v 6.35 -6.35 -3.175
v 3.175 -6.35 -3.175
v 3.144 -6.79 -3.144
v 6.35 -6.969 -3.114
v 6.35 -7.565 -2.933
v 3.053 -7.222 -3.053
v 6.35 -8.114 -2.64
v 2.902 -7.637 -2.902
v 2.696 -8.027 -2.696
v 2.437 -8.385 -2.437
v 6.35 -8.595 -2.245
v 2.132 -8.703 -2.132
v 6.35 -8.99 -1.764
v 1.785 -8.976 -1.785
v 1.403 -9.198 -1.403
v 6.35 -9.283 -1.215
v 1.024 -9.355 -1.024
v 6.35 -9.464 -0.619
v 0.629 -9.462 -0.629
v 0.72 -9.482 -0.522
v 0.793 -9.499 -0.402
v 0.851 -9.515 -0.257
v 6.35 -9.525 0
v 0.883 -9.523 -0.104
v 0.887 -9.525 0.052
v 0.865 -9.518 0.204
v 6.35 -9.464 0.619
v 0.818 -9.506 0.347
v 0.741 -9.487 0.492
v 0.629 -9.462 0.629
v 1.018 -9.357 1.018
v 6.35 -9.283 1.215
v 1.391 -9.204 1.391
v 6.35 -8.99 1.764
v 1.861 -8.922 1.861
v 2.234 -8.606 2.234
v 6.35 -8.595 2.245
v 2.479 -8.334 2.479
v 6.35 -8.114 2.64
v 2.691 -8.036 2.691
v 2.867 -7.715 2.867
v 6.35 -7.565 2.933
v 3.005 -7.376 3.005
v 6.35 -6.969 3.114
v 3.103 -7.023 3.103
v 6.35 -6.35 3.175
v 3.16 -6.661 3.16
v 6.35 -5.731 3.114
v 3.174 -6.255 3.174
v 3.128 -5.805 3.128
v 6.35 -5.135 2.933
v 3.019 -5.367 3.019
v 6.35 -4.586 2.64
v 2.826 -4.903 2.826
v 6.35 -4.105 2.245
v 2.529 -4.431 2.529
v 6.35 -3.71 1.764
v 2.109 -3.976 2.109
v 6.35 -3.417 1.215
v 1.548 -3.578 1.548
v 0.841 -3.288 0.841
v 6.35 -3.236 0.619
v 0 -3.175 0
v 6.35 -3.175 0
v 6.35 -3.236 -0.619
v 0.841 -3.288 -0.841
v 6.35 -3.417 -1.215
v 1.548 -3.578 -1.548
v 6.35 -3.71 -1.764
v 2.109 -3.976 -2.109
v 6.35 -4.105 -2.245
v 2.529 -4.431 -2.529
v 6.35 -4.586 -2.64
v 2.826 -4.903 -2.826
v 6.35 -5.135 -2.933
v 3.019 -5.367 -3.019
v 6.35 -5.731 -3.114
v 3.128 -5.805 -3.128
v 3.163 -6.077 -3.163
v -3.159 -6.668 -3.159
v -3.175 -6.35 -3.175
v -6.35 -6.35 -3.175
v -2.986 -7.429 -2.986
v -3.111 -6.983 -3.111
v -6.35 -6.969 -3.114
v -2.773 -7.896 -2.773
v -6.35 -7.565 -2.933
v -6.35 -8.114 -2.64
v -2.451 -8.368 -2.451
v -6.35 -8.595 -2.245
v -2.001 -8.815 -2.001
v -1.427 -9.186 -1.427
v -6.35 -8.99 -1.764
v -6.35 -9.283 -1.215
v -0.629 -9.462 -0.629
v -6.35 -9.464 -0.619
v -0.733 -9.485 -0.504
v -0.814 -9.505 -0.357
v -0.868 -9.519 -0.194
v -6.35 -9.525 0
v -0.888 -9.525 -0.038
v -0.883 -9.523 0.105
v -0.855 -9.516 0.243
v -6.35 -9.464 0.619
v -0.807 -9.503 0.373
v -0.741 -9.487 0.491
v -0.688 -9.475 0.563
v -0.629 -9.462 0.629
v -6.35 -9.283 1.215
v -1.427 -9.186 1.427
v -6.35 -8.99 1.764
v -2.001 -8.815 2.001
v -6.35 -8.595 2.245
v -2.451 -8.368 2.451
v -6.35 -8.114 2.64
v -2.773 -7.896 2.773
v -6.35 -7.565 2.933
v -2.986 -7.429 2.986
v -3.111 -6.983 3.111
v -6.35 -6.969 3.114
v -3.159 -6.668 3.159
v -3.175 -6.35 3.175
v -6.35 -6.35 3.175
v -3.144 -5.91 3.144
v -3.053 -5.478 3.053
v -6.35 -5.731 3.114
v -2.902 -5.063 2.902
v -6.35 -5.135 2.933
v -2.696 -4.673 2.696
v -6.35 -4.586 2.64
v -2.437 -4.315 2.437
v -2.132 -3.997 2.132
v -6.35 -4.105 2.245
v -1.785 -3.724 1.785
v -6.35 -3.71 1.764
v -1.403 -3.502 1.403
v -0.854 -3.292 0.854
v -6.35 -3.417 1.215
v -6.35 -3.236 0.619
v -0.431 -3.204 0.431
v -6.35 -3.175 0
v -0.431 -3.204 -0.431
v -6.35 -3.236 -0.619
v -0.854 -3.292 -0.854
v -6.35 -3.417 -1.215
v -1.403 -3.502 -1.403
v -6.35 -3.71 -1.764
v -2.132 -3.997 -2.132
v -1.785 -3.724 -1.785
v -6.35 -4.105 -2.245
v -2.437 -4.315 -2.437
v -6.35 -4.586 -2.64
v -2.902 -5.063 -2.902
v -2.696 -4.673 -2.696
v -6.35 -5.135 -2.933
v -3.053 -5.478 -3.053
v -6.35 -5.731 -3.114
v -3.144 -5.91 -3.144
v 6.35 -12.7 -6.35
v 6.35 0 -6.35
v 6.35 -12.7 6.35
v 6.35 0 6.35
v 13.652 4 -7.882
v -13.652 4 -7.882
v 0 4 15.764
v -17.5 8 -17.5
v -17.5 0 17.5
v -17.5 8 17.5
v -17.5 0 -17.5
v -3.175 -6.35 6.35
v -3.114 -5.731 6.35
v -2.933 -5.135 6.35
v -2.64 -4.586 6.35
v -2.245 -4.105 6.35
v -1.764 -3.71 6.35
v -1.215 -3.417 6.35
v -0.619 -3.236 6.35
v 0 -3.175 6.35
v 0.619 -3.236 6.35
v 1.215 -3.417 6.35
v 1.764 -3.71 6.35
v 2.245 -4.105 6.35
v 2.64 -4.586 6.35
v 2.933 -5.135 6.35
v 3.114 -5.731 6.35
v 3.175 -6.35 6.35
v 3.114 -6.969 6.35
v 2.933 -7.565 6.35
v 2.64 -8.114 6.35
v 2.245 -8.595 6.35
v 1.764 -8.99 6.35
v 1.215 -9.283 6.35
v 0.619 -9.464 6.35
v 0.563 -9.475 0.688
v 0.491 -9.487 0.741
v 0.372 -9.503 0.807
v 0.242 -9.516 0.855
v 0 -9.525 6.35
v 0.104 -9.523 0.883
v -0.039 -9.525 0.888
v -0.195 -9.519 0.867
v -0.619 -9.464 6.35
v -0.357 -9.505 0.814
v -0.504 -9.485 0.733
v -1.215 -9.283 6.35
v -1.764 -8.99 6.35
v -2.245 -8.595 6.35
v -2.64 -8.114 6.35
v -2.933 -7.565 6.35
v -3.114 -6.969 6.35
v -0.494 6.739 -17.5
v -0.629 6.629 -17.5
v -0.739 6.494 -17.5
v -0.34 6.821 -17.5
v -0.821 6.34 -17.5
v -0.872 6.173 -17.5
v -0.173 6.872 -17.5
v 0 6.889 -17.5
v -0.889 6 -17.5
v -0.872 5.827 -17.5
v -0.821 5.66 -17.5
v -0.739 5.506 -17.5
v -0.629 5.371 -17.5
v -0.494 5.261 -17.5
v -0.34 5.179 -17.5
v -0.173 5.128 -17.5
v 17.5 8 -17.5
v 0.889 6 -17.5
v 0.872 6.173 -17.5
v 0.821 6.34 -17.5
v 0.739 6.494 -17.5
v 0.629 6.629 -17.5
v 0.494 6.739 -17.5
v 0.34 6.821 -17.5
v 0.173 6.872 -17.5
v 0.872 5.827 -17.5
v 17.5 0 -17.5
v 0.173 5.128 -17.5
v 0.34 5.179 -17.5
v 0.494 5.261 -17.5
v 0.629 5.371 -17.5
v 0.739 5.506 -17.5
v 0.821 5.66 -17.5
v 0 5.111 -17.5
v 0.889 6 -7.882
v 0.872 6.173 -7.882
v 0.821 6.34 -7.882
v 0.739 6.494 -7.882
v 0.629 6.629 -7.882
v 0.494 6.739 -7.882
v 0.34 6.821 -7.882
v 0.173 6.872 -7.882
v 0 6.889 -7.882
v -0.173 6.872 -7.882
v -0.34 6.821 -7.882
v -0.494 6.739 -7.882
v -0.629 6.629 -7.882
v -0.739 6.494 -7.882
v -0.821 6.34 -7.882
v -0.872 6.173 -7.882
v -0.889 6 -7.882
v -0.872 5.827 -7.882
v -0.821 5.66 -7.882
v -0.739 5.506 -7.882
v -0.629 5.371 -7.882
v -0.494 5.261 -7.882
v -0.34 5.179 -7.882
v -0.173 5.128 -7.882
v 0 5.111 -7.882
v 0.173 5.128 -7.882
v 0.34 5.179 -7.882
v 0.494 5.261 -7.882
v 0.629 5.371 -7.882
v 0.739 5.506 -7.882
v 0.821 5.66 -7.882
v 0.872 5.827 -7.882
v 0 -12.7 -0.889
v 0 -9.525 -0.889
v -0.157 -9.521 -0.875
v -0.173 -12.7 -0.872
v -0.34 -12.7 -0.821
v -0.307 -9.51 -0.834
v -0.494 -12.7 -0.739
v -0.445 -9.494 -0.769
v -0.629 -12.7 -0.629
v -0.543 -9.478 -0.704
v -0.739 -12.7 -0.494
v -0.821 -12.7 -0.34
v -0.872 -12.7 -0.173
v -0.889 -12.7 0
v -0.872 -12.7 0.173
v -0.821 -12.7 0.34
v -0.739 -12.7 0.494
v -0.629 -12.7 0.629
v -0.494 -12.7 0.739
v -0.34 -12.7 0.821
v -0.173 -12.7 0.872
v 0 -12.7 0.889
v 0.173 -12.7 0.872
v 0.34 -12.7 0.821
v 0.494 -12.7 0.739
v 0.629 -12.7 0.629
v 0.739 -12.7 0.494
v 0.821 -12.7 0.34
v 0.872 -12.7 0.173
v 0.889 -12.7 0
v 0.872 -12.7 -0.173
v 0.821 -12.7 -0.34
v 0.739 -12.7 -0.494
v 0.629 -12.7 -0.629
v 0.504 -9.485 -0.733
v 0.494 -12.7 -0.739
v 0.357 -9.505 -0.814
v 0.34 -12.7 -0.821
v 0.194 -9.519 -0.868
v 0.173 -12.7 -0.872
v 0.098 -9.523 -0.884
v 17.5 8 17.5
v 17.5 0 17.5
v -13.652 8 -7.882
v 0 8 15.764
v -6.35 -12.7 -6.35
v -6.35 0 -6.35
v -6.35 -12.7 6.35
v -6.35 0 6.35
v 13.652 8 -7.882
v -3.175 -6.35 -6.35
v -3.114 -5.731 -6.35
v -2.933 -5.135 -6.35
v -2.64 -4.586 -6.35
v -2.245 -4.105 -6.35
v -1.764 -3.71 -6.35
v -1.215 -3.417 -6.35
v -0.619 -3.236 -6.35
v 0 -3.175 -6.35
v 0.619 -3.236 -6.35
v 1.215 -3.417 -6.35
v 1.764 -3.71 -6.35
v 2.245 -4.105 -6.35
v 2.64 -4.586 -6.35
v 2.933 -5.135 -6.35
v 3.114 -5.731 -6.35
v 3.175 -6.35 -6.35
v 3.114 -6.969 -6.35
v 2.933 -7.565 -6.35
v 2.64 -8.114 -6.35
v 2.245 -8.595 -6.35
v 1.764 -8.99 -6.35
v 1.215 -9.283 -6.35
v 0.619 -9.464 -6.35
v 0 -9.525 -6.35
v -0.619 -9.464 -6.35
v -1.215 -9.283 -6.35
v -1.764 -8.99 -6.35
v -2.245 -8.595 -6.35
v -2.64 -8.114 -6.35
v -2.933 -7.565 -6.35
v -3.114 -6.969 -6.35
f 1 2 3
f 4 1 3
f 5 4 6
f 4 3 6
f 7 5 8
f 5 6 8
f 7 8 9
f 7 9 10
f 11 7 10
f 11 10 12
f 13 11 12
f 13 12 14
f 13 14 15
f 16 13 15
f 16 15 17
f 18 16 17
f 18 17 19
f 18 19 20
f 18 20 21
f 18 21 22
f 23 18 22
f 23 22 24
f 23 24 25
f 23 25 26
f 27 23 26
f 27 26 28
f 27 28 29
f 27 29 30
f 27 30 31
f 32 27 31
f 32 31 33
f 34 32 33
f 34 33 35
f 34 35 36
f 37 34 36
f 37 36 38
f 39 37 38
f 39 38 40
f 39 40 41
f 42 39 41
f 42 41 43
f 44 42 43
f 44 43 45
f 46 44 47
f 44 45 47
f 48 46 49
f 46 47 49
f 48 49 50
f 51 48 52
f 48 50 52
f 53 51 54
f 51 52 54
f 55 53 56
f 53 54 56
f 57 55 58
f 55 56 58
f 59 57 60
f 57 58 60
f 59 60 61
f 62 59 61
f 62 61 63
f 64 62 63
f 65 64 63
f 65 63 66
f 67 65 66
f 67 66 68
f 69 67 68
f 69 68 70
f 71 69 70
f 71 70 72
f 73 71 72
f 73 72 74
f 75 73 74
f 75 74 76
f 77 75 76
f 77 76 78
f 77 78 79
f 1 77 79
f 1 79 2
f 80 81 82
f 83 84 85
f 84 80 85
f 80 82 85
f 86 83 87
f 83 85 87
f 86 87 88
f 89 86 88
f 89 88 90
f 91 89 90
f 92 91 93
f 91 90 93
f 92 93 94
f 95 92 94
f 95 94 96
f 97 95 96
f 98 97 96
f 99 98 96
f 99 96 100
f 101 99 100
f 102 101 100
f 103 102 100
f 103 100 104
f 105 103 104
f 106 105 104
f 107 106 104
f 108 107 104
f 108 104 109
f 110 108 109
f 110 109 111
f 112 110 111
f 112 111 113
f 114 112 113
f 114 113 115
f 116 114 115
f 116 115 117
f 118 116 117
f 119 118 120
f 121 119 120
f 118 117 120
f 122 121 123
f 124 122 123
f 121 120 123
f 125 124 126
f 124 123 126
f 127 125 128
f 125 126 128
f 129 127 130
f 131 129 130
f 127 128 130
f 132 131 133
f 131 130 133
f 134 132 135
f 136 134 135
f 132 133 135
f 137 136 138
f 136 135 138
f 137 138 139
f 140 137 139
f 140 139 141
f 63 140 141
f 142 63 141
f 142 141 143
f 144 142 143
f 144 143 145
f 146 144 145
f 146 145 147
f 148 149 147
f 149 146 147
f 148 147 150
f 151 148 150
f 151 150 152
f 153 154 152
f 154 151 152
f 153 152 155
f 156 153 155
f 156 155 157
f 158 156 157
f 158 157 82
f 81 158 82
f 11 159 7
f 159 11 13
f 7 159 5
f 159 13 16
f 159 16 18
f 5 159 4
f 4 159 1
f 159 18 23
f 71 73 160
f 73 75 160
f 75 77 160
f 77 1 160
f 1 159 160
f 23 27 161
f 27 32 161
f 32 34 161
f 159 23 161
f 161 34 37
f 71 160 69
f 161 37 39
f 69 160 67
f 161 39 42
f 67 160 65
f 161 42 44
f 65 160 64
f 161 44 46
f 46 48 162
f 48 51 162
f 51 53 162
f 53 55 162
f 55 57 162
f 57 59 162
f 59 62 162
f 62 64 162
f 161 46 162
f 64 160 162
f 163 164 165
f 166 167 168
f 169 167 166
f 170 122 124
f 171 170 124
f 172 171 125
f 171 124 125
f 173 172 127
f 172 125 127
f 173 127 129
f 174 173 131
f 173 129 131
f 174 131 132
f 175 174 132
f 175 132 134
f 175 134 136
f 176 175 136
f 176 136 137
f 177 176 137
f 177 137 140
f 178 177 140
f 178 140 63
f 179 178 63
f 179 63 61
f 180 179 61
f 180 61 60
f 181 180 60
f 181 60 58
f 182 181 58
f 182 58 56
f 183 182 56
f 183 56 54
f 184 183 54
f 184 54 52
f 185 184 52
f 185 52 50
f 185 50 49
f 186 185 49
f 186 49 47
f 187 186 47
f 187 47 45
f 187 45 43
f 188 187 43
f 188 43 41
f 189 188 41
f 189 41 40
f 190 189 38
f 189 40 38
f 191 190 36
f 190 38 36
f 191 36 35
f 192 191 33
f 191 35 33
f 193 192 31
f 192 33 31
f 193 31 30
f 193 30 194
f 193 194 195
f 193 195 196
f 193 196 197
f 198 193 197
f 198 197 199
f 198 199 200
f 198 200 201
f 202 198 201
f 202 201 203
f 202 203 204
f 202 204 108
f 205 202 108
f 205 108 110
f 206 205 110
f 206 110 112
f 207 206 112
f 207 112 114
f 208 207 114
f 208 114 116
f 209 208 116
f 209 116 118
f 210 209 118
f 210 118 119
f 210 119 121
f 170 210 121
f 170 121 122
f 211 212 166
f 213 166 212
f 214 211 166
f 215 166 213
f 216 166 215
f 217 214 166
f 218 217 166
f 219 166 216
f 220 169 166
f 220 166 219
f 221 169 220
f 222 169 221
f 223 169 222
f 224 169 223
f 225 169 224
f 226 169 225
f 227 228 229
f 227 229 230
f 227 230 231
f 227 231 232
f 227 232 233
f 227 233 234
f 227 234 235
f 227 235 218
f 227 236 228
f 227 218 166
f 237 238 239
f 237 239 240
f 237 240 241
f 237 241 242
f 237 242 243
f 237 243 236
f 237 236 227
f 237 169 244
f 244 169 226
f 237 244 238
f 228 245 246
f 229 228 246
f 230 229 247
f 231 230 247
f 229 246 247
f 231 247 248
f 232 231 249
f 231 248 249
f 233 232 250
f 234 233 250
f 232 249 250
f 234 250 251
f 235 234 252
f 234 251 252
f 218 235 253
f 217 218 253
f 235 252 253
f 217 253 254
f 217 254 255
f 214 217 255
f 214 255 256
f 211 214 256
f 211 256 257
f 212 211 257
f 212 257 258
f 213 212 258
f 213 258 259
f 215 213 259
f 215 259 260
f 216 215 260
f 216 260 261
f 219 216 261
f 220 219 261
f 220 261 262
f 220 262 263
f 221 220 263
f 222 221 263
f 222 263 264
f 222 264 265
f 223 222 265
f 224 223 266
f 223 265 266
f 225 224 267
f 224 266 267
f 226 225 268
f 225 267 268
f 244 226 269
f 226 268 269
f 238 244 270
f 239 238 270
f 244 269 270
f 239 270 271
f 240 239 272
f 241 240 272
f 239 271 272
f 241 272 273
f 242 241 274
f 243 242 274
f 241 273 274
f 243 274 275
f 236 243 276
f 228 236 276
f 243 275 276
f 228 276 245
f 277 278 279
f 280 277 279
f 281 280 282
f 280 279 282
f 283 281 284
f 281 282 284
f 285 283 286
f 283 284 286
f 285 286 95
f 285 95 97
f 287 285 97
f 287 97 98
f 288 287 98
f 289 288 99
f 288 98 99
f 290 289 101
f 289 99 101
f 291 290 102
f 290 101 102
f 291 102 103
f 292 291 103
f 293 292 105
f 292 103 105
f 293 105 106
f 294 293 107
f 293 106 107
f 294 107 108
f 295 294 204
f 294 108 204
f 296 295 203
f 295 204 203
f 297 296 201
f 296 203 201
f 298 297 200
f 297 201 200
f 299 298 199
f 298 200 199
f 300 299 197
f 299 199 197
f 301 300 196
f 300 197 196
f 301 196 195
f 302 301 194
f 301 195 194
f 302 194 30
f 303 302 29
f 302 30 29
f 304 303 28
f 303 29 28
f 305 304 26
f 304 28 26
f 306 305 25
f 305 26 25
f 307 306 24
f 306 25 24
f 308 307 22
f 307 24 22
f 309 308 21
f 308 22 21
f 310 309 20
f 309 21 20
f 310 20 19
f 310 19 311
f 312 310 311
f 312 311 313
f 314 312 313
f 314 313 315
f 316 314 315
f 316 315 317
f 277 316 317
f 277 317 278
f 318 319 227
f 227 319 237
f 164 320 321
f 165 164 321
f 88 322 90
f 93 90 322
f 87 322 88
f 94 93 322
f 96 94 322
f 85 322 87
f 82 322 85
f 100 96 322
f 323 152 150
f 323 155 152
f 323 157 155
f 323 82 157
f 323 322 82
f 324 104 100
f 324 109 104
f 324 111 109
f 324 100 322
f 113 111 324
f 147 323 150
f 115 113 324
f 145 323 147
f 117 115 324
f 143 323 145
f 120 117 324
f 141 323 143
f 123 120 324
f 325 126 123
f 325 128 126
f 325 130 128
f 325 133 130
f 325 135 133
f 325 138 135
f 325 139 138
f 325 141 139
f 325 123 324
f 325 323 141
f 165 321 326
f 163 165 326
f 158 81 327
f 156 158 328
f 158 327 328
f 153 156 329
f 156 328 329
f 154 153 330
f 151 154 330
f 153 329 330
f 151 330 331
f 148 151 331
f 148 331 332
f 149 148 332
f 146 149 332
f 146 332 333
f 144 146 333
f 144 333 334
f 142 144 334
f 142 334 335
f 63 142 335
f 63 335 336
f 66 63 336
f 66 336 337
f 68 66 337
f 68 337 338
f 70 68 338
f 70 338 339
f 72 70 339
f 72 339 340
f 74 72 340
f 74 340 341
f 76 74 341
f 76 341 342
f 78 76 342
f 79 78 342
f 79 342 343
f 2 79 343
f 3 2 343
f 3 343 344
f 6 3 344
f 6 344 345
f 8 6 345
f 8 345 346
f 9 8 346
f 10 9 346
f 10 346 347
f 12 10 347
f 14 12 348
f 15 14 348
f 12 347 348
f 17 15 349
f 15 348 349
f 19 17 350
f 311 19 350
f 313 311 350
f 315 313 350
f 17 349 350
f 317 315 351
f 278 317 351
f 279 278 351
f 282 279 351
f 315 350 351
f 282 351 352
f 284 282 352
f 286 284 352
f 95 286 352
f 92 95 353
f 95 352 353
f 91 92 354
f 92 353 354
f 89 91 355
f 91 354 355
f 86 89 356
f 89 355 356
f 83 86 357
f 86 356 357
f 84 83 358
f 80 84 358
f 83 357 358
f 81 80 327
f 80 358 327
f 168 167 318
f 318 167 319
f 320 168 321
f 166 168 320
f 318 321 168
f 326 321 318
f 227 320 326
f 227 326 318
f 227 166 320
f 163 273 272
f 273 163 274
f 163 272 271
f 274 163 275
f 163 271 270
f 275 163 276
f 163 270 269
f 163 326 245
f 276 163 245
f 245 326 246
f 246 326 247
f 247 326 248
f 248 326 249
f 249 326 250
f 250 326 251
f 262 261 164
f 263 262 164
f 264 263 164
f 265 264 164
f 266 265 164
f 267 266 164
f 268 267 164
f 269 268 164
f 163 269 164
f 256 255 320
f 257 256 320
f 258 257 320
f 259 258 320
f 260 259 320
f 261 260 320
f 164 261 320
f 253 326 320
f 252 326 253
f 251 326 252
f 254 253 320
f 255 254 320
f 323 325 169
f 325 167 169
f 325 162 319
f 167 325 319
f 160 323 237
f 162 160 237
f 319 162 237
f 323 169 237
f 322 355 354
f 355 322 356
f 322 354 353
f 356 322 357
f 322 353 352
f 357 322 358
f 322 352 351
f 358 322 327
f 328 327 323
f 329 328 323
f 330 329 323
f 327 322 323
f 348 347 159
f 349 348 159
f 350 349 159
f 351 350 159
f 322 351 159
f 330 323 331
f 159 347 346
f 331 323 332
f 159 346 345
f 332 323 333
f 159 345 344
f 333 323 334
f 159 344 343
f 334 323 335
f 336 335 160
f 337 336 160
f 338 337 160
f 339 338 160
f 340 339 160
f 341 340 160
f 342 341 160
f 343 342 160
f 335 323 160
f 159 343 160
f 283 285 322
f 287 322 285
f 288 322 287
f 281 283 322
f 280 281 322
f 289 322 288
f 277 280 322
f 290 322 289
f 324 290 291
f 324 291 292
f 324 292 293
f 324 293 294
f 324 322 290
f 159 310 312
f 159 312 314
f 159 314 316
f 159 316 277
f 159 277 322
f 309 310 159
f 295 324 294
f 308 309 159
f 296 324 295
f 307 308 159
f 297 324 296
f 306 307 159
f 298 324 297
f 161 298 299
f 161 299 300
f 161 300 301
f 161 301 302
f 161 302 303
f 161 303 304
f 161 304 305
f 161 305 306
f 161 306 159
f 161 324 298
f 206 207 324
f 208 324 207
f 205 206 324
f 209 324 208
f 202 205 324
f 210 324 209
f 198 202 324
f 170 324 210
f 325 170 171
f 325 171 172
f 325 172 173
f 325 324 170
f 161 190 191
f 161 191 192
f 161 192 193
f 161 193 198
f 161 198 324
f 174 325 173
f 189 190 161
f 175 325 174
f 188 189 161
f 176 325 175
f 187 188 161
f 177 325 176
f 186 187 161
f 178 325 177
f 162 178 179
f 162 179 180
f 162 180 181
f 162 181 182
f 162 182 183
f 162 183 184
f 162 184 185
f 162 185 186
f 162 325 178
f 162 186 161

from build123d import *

# Parameters (mm, degrees)
SKETCH1_W                   = 35
SKETCH1_H                   = 35
EXTRUDE1_DEPTH              = 8
EXTRUDE2_DEPTH              = 4
F_2_56_TAPPED_HOLE1_D       = 1.778
F_2_56_TAPPED_HOLE1_DEPTH   = 9.617990411
SKETCH6_W                   = 12.7
SKETCH6_H                   = 12.7
EXTRUDE3_DEPTH              = 12.7
F_1_4_0_25_DIAMETER_HOLE1_D = 6.35
F_1_4_0_25_DIAMETER_HOLE2_D = 6.35
SKETCH14_W                  = 0.889
SKETCH14_H                  = 6.35


with BuildPart() as part:
    # Sketch1 → Extrude1 (new body)
    with BuildSketch(Plane(origin=(0, 0, 0), x_dir=(1, 0, 0), z_dir=(0, 1, 0))):
        Rectangle(SKETCH1_W, SKETCH1_H)
    extrude(amount=EXTRUDE1_DEPTH)

    # Sketch2 → Extrude2 (cut)
    with BuildSketch(Plane(origin=(0, 8, 0), x_dir=(1, 0, 0), z_dir=(0, 1, 0))):
        Polygon((0, -15.764019179), (13.652041074, 7.882009589), (-13.652041074, 7.882009589), align=None)
    extrude(amount=-EXTRUDE2_DEPTH, mode=Mode.SUBTRACT)

    # #2-56 Tapped Hole1
    with Locations(Plane(origin=(0, 6, -17.5), x_dir=(-1, 0, 0), z_dir=(0, 0, -1))):
        with Locations((0, 0)):
            Hole(F_2_56_TAPPED_HOLE1_D / 2, depth=F_2_56_TAPPED_HOLE1_DEPTH)

    # Sketch6 → Extrude3 (add)
    with BuildSketch(Plane.XZ):
        Rectangle(SKETCH6_W, SKETCH6_H)
    extrude(amount=EXTRUDE3_DEPTH)

    # 1/4 (0.25) Diameter Hole1 (through all)
    with Locations(Plane(origin=(0, -6.35, 6.35), x_dir=(1, 0, 0), z_dir=(0, 0, 1))):
        with Locations((0, 0)):
            Hole(F_1_4_0_25_DIAMETER_HOLE1_D / 2)

    # 1/4 (0.25) Diameter Hole2 (through all)
    with Locations(Plane(origin=(6.35, -6.35, 0), x_dir=(0, 0, 1), z_dir=(1, 0, 0))):
        with Locations((0, 0)):
            Hole(F_1_4_0_25_DIAMETER_HOLE2_D / 2)

    # Sketch14 → #2-56 Tapped Hole2 (revolve, cut)
    with BuildSketch(Plane(origin=(0, -12.7, 0), x_dir=(0, 0, -1), z_dir=(1, 0, 0))):
        with Locations((0.4445, 3.175)):
            Rectangle(SKETCH14_W, SKETCH14_H)
    revolve(axis=Axis((0, -19.05, 0), (0, 1, 0)), mode=Mode.SUBTRACT)


solid = part.part
